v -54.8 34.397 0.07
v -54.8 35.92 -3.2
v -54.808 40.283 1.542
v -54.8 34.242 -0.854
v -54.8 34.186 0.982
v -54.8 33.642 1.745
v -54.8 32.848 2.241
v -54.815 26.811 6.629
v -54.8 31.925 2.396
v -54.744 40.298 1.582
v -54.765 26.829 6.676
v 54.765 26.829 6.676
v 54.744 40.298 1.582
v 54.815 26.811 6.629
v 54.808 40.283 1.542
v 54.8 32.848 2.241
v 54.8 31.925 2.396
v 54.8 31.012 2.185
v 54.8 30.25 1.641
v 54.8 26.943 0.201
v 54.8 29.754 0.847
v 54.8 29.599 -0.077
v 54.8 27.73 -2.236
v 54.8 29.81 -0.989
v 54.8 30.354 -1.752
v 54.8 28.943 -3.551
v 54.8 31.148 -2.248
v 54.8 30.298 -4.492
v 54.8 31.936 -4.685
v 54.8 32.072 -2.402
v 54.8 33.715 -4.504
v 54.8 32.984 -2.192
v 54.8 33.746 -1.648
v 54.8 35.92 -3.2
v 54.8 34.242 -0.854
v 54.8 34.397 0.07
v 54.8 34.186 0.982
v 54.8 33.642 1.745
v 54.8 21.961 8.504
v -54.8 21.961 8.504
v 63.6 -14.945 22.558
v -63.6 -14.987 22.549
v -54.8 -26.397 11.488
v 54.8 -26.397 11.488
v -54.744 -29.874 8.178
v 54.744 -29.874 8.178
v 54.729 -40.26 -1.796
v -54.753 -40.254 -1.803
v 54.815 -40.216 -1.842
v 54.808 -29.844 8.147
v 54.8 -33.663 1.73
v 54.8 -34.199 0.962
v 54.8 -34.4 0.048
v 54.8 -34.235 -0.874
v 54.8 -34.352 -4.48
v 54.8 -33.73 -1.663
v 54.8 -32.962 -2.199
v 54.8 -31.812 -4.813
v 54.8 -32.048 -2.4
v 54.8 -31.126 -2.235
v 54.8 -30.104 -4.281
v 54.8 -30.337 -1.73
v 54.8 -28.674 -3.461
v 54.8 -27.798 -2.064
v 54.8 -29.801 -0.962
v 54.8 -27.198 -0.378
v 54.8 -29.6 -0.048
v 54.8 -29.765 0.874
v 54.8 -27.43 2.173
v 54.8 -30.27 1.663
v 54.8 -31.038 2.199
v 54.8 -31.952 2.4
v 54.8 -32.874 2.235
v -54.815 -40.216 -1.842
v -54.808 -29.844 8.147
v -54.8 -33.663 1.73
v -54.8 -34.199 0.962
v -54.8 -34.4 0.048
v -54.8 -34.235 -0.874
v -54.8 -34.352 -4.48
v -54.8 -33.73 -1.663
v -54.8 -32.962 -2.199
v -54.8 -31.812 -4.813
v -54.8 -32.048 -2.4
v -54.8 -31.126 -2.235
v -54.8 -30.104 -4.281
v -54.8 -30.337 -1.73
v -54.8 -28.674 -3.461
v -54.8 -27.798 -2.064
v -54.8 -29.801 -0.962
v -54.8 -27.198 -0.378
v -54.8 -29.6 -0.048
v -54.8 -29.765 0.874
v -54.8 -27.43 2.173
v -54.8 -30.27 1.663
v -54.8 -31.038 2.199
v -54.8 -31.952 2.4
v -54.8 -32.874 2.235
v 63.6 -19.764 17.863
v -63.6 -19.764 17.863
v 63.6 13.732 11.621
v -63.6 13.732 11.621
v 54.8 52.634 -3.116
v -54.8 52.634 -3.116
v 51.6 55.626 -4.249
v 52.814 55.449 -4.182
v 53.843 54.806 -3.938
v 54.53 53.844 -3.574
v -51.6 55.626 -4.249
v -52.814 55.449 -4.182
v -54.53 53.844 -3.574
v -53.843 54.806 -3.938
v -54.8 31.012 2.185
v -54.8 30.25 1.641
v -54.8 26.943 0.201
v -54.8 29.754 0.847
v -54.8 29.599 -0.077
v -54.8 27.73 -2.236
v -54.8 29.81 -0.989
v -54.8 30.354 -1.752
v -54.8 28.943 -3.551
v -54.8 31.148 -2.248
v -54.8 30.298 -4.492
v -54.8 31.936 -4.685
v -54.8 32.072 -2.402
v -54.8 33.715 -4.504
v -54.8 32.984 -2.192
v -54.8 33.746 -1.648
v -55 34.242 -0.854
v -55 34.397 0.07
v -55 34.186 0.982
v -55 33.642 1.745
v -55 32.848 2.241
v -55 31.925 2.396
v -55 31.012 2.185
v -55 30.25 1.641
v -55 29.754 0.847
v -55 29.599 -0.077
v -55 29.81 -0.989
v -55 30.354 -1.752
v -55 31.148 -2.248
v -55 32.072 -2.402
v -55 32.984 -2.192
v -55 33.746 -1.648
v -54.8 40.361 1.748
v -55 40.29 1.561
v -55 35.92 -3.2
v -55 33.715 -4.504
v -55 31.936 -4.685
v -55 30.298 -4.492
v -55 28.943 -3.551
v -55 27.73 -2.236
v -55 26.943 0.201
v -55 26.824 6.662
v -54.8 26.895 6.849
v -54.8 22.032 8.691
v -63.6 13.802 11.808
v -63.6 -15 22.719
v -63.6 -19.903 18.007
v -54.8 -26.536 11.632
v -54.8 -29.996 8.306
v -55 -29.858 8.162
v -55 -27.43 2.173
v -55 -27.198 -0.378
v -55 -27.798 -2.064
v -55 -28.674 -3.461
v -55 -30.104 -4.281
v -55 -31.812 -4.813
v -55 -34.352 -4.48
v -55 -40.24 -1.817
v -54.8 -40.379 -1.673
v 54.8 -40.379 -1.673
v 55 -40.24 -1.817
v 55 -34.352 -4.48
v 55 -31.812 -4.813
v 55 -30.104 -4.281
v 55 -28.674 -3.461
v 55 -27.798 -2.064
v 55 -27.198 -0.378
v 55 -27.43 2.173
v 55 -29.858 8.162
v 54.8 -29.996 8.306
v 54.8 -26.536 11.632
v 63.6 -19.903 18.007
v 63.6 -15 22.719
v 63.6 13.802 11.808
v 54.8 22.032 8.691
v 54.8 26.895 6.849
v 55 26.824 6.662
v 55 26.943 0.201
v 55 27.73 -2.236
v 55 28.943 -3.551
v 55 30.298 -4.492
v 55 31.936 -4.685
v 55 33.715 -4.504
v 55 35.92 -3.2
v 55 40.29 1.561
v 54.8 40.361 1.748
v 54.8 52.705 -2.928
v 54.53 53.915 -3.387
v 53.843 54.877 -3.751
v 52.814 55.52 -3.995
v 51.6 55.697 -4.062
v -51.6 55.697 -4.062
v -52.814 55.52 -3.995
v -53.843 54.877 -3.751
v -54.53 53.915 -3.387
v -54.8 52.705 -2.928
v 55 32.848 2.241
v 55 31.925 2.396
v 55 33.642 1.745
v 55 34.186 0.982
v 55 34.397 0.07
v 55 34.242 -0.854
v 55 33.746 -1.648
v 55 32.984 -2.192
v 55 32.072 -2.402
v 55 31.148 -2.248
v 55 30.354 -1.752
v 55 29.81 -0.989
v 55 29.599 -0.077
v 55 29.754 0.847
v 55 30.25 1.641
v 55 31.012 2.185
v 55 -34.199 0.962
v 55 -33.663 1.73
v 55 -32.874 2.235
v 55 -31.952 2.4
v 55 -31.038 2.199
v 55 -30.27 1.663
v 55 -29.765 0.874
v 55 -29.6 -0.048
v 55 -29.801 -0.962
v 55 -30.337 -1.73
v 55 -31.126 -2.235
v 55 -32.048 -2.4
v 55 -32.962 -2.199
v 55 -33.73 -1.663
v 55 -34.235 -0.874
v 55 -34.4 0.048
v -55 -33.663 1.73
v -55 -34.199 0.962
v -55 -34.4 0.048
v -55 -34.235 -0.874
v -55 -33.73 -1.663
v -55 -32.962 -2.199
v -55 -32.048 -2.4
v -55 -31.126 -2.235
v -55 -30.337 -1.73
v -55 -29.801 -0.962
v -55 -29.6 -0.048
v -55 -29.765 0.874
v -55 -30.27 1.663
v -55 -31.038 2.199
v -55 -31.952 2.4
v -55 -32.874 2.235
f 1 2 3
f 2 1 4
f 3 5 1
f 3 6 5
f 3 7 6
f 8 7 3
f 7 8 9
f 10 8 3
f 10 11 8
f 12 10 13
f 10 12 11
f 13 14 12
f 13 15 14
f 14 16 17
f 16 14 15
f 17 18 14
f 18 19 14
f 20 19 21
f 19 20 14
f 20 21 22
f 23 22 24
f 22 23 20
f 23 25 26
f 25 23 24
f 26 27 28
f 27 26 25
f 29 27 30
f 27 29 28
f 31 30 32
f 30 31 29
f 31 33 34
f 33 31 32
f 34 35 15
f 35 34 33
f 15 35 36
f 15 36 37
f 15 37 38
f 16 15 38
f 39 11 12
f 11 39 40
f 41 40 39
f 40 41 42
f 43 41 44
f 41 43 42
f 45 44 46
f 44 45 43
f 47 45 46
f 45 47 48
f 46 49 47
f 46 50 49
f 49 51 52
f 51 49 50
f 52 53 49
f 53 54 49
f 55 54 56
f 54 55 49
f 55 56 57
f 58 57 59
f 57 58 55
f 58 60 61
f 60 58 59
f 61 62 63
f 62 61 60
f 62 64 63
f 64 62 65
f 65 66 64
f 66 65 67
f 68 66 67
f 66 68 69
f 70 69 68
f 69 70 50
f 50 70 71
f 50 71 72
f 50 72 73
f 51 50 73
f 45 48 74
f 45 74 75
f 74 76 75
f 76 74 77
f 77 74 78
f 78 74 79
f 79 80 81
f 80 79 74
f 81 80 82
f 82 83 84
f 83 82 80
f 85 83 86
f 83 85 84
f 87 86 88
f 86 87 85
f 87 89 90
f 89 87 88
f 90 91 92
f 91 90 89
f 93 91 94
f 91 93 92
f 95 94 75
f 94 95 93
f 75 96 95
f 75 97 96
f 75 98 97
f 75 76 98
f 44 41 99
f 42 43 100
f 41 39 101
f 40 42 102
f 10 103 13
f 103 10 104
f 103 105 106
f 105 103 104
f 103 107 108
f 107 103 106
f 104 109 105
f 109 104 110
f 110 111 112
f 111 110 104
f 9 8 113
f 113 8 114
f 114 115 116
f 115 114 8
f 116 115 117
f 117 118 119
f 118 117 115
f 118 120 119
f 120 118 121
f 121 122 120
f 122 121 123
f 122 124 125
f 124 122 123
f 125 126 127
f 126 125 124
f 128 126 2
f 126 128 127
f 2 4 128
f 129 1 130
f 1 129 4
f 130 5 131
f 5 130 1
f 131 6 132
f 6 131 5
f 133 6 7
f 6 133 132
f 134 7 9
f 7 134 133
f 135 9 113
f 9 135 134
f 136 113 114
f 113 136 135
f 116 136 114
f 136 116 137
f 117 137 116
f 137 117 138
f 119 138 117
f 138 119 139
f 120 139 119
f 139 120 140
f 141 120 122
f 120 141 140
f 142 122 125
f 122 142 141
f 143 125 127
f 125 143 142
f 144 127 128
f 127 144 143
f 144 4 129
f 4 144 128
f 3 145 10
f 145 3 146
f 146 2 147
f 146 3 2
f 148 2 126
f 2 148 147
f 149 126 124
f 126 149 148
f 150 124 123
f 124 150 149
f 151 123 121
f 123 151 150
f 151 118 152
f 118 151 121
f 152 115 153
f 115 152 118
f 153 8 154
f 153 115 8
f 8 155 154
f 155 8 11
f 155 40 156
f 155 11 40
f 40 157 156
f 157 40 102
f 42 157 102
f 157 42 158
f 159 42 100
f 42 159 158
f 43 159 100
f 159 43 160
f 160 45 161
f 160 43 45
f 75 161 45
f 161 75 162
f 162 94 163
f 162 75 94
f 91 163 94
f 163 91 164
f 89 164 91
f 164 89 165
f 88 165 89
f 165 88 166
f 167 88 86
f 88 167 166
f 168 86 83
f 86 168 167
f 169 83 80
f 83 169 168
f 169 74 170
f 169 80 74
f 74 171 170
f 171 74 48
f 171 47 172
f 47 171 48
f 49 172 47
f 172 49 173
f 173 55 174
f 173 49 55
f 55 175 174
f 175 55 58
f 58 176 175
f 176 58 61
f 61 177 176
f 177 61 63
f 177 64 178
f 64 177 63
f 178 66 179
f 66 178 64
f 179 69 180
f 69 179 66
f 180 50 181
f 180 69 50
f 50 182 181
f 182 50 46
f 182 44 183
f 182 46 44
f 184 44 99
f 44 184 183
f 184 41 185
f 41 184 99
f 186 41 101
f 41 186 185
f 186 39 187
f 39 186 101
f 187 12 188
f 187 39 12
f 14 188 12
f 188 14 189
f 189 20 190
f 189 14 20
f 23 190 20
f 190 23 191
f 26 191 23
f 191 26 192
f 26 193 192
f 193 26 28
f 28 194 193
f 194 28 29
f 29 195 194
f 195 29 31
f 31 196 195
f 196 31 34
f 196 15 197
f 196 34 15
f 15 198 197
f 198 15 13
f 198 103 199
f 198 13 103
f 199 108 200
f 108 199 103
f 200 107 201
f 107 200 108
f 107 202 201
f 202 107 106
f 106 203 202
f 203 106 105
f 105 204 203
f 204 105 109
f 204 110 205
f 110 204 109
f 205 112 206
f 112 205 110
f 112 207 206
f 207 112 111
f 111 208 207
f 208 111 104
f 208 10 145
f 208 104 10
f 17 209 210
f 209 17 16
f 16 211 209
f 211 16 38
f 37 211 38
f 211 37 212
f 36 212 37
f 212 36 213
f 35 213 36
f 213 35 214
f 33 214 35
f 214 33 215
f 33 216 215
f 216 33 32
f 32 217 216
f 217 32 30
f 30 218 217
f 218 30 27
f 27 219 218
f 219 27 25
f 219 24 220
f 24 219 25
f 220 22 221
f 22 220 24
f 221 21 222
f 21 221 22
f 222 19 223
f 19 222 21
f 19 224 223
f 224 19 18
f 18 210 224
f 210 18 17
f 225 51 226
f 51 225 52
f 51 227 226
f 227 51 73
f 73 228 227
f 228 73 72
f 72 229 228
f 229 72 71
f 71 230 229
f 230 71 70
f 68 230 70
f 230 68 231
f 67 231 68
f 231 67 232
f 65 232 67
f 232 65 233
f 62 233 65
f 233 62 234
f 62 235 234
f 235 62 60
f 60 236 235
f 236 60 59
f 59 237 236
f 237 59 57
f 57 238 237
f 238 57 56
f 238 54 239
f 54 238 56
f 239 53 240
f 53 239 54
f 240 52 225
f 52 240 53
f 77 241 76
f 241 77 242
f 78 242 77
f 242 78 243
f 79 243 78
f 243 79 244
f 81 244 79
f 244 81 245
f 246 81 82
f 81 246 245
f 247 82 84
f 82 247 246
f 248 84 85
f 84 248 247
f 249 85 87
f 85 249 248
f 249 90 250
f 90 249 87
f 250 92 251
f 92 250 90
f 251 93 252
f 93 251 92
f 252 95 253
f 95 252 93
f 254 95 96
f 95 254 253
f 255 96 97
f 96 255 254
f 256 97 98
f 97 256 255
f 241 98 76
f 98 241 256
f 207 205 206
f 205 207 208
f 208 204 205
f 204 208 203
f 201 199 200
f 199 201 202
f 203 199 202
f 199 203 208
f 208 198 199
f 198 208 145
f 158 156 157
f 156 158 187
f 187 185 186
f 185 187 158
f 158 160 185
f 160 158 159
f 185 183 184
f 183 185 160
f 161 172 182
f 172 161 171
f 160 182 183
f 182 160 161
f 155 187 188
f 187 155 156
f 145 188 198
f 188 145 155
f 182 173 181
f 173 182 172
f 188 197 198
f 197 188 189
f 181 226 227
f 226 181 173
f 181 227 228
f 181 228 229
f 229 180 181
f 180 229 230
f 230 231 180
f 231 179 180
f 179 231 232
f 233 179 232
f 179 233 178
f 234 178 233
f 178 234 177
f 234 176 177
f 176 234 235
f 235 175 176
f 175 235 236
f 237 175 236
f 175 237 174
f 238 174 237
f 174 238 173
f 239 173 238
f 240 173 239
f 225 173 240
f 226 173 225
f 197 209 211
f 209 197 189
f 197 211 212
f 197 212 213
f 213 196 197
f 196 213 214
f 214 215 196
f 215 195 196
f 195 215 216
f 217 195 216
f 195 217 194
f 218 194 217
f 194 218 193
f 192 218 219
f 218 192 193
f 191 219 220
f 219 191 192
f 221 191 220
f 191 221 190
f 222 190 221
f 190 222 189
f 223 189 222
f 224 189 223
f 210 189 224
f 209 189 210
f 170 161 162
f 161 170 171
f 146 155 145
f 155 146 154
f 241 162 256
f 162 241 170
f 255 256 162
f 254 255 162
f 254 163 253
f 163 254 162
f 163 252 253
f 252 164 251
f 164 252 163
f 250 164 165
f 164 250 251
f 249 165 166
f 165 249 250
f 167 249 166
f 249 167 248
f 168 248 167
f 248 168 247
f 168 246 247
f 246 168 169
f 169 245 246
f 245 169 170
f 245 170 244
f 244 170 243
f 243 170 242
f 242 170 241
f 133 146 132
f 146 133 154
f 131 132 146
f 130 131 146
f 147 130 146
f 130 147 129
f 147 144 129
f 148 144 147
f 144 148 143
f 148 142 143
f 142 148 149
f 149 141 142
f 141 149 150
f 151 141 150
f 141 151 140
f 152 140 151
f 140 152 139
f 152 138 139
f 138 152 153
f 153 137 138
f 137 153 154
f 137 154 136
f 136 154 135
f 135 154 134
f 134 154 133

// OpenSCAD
use <../lib.scad>
use <s/u9331c01s01.scad>
use <s/u9331c01s02.scad>
use <s/u9331c01s03.scad>
function ldraw_lib__28896c01() = [
// 0 Cardboard Ramp 16 x 14 with Medium Azure Arrow and Chevrons Pattern (Formed)
// 0 Name: 28896c01.dat
// 0 Author: Philippe Hurbain [Philo]
// 0 !LDRAW_ORG Part UPDATE 2023-03
// 0 !LICENSE Licensed under CC BY 4.0 : see CAreadme.txt
// 
// 0 BFC CERTIFY CCW
  [0,"BFC","CERTIFY"],
  [0,"BFC","CCW"],
// 
// 0 !CATEGORY Sheet Cardboard
// 0 !KEYWORDS Set 42059, Stunt Truck
// 
// 0 !HISTORY 2023-06-24 [OrionP] Official Update 2023-03
// 
// 
// 1 16 0 0 0 1 0 0 0 1 0 0 0 1 s\u9331c01s01.dat
  [1,16,0,0,0,1,0,0,0,1,0,0,0,1, ldraw_lib__s__u9331c01s01()],
// 0 !TEXMAP START PLANAR -160 0 139.243 160 0 139.243 -160 0 -100.947 28896c01a.png
// 0 !: 1 16 0 0 0 1 0 0 0 1 0 0 0 1 s\u9331c01s02.dat
// 0 !TEXMAP FALLBACK
// 1 16 0 0 0 1 0 0 0 1 0 0 0 1 s\u9331c01s02.dat
  [1,16,0,0,0,1,0,0,0,1,0,0,0,1, ldraw_lib__s__u9331c01s02()],
// 0 !TEXMAP END
// 0 !TEXMAP START PLANAR 0 -20.5 -100.5 0 -20.5 100.5 0 12.5 -100.5 28884c01b.png
// 0 !: 1 16 0 0 0 1 0 0 0 1 0 0 0 1 s\u9331c01s03.dat
// 0 !TEXMAP FALLBACK
// 1 16 0 0 0 1 0 0 0 1 0 0 0 1 s\u9331c01s03.dat
  [1,16,0,0,0,1,0,0,0,1,0,0,0,1, ldraw_lib__s__u9331c01s03()],
// 0 !TEXMAP END
// 0 !TEXMAP START PLANAR 0 -20.5 100.5 0 -20.5 -100.5 0 12.5 100.5 28884c01b.png
// 0 !: 1 16 0 0 0 -1 0 0 0 1 0 0 0 1 s\u9331c01s03.dat
// 0 !TEXMAP FALLBACK
// 1 16 0 0 0 -1 0 0 0 1 0 0 0 1 s\u9331c01s03.dat
  [1,16,0,0,0,-1,0,0,0,1,0,0,0,1, ldraw_lib__s__u9331c01s03()],
// 0 !TEXMAP END
];
module ldraw_lib__28896c01(step=0, col=false, unit=2/5, alt=false, line=0.2, solid=!$preview)
    makepoly(ldraw_lib__28896c01(), step=step, col=col, unit=unit, alt=alt, line=line, solid=solid);
ldraw_lib__28896c01(line=0.2);
